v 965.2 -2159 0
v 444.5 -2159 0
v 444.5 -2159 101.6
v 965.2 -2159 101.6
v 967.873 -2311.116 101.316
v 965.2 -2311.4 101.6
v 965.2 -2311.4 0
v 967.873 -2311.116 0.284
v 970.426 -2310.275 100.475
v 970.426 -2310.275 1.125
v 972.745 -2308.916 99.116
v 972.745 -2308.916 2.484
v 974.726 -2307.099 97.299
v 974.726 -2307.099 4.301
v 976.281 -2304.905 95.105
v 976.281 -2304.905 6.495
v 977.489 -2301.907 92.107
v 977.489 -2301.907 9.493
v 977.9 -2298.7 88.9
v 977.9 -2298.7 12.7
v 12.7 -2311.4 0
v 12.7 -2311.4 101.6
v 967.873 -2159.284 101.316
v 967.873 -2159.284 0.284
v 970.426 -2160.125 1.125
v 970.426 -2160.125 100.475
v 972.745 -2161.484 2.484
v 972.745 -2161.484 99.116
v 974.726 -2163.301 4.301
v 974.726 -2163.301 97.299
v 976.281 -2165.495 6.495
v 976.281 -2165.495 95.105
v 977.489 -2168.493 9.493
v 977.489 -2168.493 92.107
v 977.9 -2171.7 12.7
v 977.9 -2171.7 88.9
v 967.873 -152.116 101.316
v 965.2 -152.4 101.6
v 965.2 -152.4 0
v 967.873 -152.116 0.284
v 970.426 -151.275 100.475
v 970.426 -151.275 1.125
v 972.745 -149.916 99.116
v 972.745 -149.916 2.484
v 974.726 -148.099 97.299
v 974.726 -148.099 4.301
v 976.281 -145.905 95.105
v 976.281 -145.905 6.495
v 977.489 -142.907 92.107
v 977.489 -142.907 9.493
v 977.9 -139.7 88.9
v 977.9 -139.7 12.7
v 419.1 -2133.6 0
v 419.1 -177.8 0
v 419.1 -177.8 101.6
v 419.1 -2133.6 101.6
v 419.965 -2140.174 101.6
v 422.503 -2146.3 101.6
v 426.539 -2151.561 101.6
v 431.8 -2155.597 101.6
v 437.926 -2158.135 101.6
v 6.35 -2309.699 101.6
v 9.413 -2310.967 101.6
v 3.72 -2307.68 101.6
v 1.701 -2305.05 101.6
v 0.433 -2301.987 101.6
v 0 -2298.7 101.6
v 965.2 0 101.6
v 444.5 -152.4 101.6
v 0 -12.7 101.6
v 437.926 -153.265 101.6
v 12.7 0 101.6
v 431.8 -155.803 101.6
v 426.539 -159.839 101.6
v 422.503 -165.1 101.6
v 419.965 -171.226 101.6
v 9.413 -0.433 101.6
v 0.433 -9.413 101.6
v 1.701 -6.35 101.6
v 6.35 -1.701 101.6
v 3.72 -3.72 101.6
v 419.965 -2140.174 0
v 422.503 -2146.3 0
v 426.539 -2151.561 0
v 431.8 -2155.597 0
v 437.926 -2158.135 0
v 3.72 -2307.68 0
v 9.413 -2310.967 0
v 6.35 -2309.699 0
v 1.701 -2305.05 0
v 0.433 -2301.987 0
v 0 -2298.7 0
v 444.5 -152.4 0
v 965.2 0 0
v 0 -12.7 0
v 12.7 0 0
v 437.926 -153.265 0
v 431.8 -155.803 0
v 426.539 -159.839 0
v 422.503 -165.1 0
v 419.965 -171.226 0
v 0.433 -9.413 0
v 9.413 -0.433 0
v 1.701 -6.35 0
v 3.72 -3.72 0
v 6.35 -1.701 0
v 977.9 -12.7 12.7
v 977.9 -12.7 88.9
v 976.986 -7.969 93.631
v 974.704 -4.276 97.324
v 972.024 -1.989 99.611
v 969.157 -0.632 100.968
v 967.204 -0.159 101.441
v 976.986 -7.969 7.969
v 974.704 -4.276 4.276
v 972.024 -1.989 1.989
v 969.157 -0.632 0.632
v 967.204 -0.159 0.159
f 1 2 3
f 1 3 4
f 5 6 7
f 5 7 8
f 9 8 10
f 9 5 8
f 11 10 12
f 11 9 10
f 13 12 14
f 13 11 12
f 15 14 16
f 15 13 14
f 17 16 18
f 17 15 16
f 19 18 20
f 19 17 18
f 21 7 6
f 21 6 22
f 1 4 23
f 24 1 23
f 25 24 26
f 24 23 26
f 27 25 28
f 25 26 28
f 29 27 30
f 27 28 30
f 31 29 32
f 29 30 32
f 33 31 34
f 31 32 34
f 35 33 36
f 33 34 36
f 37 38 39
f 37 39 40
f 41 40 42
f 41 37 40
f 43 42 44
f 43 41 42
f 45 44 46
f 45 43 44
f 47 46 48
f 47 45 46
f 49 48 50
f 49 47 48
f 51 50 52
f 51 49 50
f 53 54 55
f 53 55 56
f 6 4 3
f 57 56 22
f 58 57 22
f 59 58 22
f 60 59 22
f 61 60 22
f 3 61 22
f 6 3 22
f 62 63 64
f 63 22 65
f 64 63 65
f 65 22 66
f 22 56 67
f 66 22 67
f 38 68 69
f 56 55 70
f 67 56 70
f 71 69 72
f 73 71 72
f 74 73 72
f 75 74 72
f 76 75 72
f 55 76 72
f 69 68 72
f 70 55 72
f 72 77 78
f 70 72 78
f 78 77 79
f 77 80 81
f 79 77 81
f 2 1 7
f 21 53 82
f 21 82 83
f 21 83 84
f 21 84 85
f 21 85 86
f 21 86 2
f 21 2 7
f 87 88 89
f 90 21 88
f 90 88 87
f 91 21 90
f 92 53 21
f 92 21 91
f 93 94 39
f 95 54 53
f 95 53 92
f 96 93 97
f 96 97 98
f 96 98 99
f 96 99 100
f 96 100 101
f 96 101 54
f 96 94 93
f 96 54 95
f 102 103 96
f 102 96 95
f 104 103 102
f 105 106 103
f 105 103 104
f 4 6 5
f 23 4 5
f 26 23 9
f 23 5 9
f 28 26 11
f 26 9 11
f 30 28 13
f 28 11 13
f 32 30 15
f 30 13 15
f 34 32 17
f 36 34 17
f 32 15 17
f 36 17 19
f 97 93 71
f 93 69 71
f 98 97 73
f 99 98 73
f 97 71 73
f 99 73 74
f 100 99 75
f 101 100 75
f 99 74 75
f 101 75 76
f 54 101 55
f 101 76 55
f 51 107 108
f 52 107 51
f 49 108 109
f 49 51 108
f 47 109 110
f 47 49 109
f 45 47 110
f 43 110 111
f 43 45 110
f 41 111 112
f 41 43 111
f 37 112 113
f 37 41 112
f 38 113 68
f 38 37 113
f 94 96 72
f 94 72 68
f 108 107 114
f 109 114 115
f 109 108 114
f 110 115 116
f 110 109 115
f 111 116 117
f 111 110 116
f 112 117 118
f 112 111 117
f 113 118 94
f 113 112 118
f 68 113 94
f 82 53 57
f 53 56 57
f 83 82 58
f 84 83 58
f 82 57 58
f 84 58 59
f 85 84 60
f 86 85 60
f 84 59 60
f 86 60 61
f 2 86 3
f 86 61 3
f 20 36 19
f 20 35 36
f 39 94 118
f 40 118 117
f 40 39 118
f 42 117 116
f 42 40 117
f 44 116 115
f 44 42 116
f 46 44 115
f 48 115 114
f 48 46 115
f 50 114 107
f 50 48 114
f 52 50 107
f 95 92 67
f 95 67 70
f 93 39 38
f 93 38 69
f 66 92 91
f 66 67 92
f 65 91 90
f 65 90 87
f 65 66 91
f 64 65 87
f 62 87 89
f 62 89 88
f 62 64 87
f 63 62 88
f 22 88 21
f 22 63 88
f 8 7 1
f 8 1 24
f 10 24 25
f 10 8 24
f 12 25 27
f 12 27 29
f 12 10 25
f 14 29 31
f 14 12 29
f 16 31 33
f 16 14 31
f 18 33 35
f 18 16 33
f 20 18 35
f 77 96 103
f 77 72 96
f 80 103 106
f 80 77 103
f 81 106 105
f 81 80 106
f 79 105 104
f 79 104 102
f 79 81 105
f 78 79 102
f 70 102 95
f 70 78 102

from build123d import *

# Parameters (mm, degrees)
BOSS_EXTRUDE1_DEPTH = 101.6
FILLET1_R           = 25.4
FILLET2_R           = 12.7


with BuildPart() as part:
    # Sketch1 → Boss-Extrude1 (new body)
    with BuildSketch(Plane.XY):
        Polygon((977.9, -152.4), (419.1, -152.4), (419.1, -2159), (977.9, -2159), (977.9, -2311.4), (0, -2311.4), (0, 0), (977.9, 0), align=None)
    extrude(amount=BOSS_EXTRUDE1_DEPTH)

    # Fillet1
    fillet1_edges = [part.edges().sort_by_distance(p)[0] for p in [
        (419.1, -152.4, 50.8),
        (419.1, -2159, 50.8),
    ]]
    fillet(fillet1_edges, radius=FILLET1_R)

    # Fillet2
    fillet2_edges = [part.edges().sort_by_distance(p)[0] for p in [
        (977.9, -2235.2, 101.6),
        (0, 0, 50.8),
        (977.9, 0, 50.8),
        (977.9, -152.4, 50.8),
        (977.9, -2159, 50.8),
        (977.9, -2311.4, 50.8),
        (0, -2311.4, 50.8),
        (977.9, -76.2, 101.6),
        (977.9, -76.2, 0),
        (977.9, -2235.2, 0),
    ]]
    fillet(fillet2_edges, radius=FILLET2_R)


solid = part.part
